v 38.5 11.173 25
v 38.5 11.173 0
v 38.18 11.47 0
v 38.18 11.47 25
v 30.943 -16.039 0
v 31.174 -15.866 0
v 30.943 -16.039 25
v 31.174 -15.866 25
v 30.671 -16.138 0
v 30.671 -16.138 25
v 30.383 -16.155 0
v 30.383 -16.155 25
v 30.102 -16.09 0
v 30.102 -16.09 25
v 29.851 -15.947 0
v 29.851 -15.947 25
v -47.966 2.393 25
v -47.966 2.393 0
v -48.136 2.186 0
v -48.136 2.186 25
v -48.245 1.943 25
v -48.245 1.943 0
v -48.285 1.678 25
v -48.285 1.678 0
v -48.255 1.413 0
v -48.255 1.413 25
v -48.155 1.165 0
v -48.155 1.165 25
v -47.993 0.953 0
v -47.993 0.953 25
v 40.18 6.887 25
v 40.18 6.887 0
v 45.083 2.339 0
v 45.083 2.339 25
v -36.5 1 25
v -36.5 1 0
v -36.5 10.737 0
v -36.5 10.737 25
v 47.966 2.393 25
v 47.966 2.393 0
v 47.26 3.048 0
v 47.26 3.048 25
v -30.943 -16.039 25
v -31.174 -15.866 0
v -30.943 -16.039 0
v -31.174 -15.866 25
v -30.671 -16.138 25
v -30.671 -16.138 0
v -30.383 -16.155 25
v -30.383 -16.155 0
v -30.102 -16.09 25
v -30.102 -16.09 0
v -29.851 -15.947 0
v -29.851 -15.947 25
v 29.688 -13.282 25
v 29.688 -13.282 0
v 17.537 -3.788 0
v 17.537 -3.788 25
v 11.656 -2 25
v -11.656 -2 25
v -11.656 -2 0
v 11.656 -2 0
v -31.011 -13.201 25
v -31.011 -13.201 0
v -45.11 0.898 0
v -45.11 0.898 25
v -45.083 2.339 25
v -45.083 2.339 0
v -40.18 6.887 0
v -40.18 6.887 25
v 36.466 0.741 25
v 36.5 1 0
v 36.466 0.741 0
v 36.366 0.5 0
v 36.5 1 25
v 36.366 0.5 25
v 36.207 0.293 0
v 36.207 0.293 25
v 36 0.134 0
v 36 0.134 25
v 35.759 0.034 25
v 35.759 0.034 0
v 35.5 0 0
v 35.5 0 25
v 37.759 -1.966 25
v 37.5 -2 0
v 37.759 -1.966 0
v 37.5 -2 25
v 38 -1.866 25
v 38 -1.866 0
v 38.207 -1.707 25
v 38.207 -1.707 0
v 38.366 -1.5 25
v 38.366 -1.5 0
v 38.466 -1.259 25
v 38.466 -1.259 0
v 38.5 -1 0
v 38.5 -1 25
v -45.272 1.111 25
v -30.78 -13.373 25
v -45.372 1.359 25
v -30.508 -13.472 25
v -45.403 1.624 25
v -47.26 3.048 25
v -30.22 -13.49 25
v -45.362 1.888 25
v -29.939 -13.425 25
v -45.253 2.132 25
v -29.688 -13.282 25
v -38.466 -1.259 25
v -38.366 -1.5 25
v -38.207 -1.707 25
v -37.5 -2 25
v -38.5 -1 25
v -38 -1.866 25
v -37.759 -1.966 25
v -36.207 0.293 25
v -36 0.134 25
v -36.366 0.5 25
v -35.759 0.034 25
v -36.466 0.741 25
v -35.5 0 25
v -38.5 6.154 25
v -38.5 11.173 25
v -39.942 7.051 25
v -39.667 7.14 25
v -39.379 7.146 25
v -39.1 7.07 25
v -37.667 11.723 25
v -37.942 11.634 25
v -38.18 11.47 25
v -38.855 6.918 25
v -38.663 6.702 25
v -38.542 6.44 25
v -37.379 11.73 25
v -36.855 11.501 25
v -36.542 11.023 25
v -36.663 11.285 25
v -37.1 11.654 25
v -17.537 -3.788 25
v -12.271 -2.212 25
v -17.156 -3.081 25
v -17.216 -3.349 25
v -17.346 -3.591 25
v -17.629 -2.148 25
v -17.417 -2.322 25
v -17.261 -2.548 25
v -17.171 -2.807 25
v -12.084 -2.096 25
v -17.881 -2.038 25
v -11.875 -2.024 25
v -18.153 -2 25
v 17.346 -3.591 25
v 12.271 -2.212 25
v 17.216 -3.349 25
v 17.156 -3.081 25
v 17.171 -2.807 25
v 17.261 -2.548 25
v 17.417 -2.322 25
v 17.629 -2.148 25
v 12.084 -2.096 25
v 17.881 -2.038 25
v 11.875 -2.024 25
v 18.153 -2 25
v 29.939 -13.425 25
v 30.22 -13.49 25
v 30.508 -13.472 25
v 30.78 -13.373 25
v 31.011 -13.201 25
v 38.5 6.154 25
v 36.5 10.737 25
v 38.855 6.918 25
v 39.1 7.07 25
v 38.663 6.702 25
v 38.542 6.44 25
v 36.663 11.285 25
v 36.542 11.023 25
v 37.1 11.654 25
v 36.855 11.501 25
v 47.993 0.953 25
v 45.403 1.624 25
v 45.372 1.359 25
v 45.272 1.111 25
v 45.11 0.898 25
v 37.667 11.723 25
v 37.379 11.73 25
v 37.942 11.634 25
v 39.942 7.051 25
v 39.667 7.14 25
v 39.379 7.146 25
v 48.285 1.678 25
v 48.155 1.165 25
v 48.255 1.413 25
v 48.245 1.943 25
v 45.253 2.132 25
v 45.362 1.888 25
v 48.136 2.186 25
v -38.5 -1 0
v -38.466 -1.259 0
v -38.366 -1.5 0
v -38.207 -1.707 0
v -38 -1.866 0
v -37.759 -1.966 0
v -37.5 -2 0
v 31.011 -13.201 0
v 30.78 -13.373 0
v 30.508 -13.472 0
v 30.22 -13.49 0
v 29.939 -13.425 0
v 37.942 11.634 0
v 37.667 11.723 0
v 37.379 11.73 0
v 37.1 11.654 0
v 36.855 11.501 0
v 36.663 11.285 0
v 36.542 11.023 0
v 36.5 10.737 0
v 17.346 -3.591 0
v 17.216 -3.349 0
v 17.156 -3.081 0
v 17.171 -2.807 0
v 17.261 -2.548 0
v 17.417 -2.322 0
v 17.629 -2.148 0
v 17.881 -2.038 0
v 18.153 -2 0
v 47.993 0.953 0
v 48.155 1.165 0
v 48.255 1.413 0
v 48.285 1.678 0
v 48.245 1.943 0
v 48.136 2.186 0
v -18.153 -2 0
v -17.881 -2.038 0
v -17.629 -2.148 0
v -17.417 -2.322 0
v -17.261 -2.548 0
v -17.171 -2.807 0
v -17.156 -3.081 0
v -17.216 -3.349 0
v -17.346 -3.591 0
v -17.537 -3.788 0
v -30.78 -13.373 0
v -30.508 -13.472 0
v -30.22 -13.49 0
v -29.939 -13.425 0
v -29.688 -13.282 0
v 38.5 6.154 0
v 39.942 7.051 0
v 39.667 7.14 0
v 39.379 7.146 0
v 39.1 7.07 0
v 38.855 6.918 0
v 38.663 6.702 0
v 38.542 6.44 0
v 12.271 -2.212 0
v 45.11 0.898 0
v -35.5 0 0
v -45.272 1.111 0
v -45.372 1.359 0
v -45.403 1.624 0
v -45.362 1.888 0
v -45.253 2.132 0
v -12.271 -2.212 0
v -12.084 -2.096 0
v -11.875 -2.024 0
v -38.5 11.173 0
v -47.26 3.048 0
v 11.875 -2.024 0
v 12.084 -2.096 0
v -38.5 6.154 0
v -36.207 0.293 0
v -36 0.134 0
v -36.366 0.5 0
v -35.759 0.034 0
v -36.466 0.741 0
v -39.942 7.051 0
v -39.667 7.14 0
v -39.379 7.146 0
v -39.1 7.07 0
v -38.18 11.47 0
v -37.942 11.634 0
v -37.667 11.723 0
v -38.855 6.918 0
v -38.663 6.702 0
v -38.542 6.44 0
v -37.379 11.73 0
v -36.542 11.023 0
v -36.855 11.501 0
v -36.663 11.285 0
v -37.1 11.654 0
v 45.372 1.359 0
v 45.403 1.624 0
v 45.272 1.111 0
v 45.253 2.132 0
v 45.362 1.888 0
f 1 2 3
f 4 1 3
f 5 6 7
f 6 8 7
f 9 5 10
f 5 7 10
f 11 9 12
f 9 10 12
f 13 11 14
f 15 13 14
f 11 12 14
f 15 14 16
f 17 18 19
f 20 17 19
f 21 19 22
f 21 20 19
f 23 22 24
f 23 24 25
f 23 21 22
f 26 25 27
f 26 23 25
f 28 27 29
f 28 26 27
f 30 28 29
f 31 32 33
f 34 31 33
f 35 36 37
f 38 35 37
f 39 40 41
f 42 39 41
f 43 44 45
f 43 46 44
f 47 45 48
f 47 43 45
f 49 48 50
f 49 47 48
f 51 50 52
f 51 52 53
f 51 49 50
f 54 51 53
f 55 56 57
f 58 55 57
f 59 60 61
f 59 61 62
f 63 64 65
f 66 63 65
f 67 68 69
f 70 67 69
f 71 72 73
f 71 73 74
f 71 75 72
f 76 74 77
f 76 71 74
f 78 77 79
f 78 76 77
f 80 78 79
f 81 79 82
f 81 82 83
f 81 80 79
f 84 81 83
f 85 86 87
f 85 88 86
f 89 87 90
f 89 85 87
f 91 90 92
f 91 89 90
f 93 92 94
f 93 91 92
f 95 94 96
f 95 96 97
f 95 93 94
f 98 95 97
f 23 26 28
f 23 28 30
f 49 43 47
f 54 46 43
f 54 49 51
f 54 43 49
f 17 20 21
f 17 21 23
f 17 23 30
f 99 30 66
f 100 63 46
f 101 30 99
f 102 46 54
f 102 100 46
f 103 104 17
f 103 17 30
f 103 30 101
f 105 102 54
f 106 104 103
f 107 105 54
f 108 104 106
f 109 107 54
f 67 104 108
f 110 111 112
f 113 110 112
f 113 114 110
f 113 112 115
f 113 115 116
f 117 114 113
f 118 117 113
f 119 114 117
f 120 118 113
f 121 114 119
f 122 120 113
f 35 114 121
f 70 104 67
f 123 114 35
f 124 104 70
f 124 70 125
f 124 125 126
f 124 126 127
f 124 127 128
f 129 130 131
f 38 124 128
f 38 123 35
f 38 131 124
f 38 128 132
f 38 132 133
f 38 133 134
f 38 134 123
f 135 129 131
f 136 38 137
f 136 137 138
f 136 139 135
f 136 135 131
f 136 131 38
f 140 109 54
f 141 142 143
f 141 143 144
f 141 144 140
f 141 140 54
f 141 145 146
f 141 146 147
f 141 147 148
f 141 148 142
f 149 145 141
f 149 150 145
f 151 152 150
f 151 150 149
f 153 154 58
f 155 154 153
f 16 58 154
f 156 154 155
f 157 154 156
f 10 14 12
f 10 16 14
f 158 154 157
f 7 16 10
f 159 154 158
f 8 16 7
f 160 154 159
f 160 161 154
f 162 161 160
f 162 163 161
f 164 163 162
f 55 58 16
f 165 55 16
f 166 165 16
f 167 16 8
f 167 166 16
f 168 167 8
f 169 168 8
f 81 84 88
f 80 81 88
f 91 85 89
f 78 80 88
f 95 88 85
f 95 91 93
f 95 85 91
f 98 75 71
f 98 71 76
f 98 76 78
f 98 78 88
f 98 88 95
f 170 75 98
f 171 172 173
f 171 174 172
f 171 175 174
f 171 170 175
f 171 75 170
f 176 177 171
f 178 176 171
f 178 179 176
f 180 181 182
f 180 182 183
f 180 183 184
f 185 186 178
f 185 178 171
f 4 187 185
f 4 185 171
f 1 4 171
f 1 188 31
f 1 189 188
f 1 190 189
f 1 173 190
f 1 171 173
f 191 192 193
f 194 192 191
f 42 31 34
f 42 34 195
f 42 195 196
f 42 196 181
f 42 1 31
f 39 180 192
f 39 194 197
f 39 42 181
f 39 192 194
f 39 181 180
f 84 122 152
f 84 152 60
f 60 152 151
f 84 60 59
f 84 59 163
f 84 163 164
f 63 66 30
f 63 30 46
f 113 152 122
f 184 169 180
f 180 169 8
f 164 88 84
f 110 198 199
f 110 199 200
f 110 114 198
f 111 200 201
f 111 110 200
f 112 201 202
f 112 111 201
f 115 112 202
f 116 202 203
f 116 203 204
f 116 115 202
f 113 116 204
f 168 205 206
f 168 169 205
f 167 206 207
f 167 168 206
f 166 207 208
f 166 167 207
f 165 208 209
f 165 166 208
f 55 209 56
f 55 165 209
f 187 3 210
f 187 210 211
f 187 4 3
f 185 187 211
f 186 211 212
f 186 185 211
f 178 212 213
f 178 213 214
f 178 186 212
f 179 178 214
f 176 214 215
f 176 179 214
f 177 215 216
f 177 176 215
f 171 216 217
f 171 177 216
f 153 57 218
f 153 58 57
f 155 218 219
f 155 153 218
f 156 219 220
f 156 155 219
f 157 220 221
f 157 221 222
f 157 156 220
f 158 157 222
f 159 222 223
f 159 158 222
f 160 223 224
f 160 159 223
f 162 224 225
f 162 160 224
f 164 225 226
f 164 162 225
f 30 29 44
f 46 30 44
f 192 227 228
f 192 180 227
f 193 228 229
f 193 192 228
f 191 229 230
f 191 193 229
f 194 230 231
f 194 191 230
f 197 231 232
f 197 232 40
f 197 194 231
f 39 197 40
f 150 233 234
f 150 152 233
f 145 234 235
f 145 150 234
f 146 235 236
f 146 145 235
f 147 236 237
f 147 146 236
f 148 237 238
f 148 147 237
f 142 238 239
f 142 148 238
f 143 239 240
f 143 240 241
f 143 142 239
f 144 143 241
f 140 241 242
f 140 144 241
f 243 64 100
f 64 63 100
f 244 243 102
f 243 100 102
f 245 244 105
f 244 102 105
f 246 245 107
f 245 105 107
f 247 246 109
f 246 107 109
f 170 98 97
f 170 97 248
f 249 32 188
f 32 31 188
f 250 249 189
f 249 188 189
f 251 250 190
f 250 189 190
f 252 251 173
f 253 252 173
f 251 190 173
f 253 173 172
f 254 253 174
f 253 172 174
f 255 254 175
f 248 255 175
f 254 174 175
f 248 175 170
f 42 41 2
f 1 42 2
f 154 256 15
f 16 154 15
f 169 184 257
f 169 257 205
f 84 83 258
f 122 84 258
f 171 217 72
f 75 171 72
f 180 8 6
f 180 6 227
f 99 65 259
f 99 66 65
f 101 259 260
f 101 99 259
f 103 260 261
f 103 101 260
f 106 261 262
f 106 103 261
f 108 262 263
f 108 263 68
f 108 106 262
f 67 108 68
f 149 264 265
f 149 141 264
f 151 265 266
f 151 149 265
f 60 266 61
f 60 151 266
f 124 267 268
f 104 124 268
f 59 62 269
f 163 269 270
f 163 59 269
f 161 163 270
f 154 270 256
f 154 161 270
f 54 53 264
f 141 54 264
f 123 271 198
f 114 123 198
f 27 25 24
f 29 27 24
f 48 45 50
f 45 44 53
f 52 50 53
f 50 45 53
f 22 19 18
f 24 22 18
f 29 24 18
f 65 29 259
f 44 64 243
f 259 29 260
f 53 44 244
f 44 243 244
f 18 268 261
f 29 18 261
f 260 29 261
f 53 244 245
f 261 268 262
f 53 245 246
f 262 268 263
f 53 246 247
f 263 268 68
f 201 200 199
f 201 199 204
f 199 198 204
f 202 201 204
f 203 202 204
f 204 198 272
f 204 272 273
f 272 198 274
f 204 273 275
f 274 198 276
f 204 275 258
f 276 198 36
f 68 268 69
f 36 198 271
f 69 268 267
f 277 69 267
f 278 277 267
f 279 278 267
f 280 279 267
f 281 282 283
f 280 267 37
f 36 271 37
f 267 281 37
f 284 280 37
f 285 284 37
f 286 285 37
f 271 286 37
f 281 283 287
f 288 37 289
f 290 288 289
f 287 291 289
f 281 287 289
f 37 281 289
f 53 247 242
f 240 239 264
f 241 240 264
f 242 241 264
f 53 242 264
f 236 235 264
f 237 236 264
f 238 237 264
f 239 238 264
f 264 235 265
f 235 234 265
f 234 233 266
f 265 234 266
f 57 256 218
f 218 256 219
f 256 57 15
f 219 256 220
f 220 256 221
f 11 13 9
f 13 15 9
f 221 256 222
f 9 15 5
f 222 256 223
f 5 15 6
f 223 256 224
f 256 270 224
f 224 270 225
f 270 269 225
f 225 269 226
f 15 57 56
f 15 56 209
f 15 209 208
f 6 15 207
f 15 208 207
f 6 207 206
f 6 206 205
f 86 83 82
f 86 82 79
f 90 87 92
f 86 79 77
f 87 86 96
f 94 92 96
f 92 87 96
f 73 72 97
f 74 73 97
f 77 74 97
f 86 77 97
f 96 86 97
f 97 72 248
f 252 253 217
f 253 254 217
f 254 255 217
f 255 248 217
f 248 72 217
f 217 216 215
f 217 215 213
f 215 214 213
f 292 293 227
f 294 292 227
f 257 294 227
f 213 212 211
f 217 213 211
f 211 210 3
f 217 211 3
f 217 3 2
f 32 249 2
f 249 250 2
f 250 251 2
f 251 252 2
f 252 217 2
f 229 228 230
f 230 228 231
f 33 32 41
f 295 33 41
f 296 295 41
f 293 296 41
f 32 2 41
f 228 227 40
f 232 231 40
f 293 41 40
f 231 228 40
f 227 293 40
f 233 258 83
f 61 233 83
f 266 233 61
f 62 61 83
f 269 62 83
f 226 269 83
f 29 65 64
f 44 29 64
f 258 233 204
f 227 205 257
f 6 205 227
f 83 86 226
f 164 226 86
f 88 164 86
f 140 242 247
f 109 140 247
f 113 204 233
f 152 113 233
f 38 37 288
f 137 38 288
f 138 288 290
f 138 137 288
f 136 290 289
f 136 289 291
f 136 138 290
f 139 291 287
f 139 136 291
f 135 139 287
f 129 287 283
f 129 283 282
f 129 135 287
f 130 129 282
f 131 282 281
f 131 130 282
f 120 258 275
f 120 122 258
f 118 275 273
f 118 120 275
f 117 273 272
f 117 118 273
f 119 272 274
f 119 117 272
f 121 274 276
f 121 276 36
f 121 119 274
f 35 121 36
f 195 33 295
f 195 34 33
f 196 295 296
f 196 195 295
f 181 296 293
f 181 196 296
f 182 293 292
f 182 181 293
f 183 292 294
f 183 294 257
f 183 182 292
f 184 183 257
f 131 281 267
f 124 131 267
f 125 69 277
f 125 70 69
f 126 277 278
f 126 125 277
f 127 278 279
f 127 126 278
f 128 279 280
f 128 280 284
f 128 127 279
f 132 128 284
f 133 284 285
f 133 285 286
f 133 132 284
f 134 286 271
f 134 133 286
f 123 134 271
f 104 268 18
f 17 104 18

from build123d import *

# Parameters (mm, degrees)
F1_DEPTH = 25
F2_R     = 1


# Not quite as in the source:
# - a feature names something its author has since deleted; it is built from what else it names


with BuildPart() as f1:
    # F0 (on Top) → F1 (new body)
    with BuildSketch(Plane.XY):
        Polygon((0, -2), (0, 0), (-36.5, 0), (-36.5, 10.3007538181), (-38.5, 8.4454781792), (-38.5, -2), (-15.248538491, -2), (-12, -2), align=None)
        Polygon((36.5, 0), (0, 0), (0, -2), (12, -2), (15.248538491, -2), (38.5, -2), (38.5, 8.4454781792), (36.5, 10.3007538181), align=None)
        Polygon((-38.5, 8.4454781792), (-36.5, 10.3007538181), (-36.5, 13.0287654926), (-38.5, 11.1734898537), align=None)
        Polygon((-30.5484807652, -16.4916614154), (-12, -2), (-15.248538491, -2), (-30.3854576709, -13.8262573849), (-45.844322202, 1.6326071462), (-47.3116243561, 0.2714821755), align=None)
        Polygon((15.248538491, -2), (12, -2), (30.5484807652, -16.4916614154), (47.3116243561, 0.2714821755), (45.844322202, 1.6326071462), (30.3854576709, -13.8262573849), align=None)
        Polygon((36.5, 13.0287654926), (36.5, 10.3007538181), (38.5, 8.4454781792), (38.5, 11.1734898537), align=None)
        Polygon((-45.844322202, 1.6326071462), (-38.5, 8.4454781792), (-38.5, 11.1734898537), (-47.259531868, 3.0478168121), align=None)
        Polygon((38.5, 11.1734898537), (38.5, 8.4454781792), (45.844322202, 1.6326071462), (47.259531868, 3.0478168121), align=None)
        Polygon((-47.3116243561, 0.2714821755), (-45.844322202, 1.6326071462), (-47.259531868, 3.0478168121), (-48.726834022, 1.6866918414), align=None)
        Polygon((45.844322202, 1.6326071462), (47.3116243561, 0.2714821755), (48.726834022, 1.6866918414), (47.259531868, 3.0478168121), align=None)
    extrude(amount=F1_DEPTH)

    # F2
    f2_edges = [f1.edges().sort_by_distance(p)[0] for p in [
        (-36.5, 0, 12.5),
        (-38.5, -2, 12.5),
        (-15.248538, -2, 12.5),
        (15.248538, -2, 12.5),
        (30.385458, -13.826257, 12.5),
        (38.5, -2, 12.5),
        (38.5, 8.445478, 12.5),
        (45.844322, 1.632607, 12.5),
        (12, -2, 12.5),
        (30.548481, -16.491661, 12.5),
        (36.5, 13.028765, 12.5),
        (36.5, 0, 12.5),
        (48.726834, 1.686692, 12.5),
        (-45.844322, 1.632607, 12.5),
        (-48.726834, 1.686692, 12.5),
        (-36.5, 13.028765, 12.5),
        (-30.548481, -16.491661, 12.5),
        (-12, -2, 12.5),
        (-30.385458, -13.826257, 12.5),
        (-38.5, 8.445478, 12.5),
    ]]
    fillet(f2_edges, radius=F2_R)


solid = f1.part
